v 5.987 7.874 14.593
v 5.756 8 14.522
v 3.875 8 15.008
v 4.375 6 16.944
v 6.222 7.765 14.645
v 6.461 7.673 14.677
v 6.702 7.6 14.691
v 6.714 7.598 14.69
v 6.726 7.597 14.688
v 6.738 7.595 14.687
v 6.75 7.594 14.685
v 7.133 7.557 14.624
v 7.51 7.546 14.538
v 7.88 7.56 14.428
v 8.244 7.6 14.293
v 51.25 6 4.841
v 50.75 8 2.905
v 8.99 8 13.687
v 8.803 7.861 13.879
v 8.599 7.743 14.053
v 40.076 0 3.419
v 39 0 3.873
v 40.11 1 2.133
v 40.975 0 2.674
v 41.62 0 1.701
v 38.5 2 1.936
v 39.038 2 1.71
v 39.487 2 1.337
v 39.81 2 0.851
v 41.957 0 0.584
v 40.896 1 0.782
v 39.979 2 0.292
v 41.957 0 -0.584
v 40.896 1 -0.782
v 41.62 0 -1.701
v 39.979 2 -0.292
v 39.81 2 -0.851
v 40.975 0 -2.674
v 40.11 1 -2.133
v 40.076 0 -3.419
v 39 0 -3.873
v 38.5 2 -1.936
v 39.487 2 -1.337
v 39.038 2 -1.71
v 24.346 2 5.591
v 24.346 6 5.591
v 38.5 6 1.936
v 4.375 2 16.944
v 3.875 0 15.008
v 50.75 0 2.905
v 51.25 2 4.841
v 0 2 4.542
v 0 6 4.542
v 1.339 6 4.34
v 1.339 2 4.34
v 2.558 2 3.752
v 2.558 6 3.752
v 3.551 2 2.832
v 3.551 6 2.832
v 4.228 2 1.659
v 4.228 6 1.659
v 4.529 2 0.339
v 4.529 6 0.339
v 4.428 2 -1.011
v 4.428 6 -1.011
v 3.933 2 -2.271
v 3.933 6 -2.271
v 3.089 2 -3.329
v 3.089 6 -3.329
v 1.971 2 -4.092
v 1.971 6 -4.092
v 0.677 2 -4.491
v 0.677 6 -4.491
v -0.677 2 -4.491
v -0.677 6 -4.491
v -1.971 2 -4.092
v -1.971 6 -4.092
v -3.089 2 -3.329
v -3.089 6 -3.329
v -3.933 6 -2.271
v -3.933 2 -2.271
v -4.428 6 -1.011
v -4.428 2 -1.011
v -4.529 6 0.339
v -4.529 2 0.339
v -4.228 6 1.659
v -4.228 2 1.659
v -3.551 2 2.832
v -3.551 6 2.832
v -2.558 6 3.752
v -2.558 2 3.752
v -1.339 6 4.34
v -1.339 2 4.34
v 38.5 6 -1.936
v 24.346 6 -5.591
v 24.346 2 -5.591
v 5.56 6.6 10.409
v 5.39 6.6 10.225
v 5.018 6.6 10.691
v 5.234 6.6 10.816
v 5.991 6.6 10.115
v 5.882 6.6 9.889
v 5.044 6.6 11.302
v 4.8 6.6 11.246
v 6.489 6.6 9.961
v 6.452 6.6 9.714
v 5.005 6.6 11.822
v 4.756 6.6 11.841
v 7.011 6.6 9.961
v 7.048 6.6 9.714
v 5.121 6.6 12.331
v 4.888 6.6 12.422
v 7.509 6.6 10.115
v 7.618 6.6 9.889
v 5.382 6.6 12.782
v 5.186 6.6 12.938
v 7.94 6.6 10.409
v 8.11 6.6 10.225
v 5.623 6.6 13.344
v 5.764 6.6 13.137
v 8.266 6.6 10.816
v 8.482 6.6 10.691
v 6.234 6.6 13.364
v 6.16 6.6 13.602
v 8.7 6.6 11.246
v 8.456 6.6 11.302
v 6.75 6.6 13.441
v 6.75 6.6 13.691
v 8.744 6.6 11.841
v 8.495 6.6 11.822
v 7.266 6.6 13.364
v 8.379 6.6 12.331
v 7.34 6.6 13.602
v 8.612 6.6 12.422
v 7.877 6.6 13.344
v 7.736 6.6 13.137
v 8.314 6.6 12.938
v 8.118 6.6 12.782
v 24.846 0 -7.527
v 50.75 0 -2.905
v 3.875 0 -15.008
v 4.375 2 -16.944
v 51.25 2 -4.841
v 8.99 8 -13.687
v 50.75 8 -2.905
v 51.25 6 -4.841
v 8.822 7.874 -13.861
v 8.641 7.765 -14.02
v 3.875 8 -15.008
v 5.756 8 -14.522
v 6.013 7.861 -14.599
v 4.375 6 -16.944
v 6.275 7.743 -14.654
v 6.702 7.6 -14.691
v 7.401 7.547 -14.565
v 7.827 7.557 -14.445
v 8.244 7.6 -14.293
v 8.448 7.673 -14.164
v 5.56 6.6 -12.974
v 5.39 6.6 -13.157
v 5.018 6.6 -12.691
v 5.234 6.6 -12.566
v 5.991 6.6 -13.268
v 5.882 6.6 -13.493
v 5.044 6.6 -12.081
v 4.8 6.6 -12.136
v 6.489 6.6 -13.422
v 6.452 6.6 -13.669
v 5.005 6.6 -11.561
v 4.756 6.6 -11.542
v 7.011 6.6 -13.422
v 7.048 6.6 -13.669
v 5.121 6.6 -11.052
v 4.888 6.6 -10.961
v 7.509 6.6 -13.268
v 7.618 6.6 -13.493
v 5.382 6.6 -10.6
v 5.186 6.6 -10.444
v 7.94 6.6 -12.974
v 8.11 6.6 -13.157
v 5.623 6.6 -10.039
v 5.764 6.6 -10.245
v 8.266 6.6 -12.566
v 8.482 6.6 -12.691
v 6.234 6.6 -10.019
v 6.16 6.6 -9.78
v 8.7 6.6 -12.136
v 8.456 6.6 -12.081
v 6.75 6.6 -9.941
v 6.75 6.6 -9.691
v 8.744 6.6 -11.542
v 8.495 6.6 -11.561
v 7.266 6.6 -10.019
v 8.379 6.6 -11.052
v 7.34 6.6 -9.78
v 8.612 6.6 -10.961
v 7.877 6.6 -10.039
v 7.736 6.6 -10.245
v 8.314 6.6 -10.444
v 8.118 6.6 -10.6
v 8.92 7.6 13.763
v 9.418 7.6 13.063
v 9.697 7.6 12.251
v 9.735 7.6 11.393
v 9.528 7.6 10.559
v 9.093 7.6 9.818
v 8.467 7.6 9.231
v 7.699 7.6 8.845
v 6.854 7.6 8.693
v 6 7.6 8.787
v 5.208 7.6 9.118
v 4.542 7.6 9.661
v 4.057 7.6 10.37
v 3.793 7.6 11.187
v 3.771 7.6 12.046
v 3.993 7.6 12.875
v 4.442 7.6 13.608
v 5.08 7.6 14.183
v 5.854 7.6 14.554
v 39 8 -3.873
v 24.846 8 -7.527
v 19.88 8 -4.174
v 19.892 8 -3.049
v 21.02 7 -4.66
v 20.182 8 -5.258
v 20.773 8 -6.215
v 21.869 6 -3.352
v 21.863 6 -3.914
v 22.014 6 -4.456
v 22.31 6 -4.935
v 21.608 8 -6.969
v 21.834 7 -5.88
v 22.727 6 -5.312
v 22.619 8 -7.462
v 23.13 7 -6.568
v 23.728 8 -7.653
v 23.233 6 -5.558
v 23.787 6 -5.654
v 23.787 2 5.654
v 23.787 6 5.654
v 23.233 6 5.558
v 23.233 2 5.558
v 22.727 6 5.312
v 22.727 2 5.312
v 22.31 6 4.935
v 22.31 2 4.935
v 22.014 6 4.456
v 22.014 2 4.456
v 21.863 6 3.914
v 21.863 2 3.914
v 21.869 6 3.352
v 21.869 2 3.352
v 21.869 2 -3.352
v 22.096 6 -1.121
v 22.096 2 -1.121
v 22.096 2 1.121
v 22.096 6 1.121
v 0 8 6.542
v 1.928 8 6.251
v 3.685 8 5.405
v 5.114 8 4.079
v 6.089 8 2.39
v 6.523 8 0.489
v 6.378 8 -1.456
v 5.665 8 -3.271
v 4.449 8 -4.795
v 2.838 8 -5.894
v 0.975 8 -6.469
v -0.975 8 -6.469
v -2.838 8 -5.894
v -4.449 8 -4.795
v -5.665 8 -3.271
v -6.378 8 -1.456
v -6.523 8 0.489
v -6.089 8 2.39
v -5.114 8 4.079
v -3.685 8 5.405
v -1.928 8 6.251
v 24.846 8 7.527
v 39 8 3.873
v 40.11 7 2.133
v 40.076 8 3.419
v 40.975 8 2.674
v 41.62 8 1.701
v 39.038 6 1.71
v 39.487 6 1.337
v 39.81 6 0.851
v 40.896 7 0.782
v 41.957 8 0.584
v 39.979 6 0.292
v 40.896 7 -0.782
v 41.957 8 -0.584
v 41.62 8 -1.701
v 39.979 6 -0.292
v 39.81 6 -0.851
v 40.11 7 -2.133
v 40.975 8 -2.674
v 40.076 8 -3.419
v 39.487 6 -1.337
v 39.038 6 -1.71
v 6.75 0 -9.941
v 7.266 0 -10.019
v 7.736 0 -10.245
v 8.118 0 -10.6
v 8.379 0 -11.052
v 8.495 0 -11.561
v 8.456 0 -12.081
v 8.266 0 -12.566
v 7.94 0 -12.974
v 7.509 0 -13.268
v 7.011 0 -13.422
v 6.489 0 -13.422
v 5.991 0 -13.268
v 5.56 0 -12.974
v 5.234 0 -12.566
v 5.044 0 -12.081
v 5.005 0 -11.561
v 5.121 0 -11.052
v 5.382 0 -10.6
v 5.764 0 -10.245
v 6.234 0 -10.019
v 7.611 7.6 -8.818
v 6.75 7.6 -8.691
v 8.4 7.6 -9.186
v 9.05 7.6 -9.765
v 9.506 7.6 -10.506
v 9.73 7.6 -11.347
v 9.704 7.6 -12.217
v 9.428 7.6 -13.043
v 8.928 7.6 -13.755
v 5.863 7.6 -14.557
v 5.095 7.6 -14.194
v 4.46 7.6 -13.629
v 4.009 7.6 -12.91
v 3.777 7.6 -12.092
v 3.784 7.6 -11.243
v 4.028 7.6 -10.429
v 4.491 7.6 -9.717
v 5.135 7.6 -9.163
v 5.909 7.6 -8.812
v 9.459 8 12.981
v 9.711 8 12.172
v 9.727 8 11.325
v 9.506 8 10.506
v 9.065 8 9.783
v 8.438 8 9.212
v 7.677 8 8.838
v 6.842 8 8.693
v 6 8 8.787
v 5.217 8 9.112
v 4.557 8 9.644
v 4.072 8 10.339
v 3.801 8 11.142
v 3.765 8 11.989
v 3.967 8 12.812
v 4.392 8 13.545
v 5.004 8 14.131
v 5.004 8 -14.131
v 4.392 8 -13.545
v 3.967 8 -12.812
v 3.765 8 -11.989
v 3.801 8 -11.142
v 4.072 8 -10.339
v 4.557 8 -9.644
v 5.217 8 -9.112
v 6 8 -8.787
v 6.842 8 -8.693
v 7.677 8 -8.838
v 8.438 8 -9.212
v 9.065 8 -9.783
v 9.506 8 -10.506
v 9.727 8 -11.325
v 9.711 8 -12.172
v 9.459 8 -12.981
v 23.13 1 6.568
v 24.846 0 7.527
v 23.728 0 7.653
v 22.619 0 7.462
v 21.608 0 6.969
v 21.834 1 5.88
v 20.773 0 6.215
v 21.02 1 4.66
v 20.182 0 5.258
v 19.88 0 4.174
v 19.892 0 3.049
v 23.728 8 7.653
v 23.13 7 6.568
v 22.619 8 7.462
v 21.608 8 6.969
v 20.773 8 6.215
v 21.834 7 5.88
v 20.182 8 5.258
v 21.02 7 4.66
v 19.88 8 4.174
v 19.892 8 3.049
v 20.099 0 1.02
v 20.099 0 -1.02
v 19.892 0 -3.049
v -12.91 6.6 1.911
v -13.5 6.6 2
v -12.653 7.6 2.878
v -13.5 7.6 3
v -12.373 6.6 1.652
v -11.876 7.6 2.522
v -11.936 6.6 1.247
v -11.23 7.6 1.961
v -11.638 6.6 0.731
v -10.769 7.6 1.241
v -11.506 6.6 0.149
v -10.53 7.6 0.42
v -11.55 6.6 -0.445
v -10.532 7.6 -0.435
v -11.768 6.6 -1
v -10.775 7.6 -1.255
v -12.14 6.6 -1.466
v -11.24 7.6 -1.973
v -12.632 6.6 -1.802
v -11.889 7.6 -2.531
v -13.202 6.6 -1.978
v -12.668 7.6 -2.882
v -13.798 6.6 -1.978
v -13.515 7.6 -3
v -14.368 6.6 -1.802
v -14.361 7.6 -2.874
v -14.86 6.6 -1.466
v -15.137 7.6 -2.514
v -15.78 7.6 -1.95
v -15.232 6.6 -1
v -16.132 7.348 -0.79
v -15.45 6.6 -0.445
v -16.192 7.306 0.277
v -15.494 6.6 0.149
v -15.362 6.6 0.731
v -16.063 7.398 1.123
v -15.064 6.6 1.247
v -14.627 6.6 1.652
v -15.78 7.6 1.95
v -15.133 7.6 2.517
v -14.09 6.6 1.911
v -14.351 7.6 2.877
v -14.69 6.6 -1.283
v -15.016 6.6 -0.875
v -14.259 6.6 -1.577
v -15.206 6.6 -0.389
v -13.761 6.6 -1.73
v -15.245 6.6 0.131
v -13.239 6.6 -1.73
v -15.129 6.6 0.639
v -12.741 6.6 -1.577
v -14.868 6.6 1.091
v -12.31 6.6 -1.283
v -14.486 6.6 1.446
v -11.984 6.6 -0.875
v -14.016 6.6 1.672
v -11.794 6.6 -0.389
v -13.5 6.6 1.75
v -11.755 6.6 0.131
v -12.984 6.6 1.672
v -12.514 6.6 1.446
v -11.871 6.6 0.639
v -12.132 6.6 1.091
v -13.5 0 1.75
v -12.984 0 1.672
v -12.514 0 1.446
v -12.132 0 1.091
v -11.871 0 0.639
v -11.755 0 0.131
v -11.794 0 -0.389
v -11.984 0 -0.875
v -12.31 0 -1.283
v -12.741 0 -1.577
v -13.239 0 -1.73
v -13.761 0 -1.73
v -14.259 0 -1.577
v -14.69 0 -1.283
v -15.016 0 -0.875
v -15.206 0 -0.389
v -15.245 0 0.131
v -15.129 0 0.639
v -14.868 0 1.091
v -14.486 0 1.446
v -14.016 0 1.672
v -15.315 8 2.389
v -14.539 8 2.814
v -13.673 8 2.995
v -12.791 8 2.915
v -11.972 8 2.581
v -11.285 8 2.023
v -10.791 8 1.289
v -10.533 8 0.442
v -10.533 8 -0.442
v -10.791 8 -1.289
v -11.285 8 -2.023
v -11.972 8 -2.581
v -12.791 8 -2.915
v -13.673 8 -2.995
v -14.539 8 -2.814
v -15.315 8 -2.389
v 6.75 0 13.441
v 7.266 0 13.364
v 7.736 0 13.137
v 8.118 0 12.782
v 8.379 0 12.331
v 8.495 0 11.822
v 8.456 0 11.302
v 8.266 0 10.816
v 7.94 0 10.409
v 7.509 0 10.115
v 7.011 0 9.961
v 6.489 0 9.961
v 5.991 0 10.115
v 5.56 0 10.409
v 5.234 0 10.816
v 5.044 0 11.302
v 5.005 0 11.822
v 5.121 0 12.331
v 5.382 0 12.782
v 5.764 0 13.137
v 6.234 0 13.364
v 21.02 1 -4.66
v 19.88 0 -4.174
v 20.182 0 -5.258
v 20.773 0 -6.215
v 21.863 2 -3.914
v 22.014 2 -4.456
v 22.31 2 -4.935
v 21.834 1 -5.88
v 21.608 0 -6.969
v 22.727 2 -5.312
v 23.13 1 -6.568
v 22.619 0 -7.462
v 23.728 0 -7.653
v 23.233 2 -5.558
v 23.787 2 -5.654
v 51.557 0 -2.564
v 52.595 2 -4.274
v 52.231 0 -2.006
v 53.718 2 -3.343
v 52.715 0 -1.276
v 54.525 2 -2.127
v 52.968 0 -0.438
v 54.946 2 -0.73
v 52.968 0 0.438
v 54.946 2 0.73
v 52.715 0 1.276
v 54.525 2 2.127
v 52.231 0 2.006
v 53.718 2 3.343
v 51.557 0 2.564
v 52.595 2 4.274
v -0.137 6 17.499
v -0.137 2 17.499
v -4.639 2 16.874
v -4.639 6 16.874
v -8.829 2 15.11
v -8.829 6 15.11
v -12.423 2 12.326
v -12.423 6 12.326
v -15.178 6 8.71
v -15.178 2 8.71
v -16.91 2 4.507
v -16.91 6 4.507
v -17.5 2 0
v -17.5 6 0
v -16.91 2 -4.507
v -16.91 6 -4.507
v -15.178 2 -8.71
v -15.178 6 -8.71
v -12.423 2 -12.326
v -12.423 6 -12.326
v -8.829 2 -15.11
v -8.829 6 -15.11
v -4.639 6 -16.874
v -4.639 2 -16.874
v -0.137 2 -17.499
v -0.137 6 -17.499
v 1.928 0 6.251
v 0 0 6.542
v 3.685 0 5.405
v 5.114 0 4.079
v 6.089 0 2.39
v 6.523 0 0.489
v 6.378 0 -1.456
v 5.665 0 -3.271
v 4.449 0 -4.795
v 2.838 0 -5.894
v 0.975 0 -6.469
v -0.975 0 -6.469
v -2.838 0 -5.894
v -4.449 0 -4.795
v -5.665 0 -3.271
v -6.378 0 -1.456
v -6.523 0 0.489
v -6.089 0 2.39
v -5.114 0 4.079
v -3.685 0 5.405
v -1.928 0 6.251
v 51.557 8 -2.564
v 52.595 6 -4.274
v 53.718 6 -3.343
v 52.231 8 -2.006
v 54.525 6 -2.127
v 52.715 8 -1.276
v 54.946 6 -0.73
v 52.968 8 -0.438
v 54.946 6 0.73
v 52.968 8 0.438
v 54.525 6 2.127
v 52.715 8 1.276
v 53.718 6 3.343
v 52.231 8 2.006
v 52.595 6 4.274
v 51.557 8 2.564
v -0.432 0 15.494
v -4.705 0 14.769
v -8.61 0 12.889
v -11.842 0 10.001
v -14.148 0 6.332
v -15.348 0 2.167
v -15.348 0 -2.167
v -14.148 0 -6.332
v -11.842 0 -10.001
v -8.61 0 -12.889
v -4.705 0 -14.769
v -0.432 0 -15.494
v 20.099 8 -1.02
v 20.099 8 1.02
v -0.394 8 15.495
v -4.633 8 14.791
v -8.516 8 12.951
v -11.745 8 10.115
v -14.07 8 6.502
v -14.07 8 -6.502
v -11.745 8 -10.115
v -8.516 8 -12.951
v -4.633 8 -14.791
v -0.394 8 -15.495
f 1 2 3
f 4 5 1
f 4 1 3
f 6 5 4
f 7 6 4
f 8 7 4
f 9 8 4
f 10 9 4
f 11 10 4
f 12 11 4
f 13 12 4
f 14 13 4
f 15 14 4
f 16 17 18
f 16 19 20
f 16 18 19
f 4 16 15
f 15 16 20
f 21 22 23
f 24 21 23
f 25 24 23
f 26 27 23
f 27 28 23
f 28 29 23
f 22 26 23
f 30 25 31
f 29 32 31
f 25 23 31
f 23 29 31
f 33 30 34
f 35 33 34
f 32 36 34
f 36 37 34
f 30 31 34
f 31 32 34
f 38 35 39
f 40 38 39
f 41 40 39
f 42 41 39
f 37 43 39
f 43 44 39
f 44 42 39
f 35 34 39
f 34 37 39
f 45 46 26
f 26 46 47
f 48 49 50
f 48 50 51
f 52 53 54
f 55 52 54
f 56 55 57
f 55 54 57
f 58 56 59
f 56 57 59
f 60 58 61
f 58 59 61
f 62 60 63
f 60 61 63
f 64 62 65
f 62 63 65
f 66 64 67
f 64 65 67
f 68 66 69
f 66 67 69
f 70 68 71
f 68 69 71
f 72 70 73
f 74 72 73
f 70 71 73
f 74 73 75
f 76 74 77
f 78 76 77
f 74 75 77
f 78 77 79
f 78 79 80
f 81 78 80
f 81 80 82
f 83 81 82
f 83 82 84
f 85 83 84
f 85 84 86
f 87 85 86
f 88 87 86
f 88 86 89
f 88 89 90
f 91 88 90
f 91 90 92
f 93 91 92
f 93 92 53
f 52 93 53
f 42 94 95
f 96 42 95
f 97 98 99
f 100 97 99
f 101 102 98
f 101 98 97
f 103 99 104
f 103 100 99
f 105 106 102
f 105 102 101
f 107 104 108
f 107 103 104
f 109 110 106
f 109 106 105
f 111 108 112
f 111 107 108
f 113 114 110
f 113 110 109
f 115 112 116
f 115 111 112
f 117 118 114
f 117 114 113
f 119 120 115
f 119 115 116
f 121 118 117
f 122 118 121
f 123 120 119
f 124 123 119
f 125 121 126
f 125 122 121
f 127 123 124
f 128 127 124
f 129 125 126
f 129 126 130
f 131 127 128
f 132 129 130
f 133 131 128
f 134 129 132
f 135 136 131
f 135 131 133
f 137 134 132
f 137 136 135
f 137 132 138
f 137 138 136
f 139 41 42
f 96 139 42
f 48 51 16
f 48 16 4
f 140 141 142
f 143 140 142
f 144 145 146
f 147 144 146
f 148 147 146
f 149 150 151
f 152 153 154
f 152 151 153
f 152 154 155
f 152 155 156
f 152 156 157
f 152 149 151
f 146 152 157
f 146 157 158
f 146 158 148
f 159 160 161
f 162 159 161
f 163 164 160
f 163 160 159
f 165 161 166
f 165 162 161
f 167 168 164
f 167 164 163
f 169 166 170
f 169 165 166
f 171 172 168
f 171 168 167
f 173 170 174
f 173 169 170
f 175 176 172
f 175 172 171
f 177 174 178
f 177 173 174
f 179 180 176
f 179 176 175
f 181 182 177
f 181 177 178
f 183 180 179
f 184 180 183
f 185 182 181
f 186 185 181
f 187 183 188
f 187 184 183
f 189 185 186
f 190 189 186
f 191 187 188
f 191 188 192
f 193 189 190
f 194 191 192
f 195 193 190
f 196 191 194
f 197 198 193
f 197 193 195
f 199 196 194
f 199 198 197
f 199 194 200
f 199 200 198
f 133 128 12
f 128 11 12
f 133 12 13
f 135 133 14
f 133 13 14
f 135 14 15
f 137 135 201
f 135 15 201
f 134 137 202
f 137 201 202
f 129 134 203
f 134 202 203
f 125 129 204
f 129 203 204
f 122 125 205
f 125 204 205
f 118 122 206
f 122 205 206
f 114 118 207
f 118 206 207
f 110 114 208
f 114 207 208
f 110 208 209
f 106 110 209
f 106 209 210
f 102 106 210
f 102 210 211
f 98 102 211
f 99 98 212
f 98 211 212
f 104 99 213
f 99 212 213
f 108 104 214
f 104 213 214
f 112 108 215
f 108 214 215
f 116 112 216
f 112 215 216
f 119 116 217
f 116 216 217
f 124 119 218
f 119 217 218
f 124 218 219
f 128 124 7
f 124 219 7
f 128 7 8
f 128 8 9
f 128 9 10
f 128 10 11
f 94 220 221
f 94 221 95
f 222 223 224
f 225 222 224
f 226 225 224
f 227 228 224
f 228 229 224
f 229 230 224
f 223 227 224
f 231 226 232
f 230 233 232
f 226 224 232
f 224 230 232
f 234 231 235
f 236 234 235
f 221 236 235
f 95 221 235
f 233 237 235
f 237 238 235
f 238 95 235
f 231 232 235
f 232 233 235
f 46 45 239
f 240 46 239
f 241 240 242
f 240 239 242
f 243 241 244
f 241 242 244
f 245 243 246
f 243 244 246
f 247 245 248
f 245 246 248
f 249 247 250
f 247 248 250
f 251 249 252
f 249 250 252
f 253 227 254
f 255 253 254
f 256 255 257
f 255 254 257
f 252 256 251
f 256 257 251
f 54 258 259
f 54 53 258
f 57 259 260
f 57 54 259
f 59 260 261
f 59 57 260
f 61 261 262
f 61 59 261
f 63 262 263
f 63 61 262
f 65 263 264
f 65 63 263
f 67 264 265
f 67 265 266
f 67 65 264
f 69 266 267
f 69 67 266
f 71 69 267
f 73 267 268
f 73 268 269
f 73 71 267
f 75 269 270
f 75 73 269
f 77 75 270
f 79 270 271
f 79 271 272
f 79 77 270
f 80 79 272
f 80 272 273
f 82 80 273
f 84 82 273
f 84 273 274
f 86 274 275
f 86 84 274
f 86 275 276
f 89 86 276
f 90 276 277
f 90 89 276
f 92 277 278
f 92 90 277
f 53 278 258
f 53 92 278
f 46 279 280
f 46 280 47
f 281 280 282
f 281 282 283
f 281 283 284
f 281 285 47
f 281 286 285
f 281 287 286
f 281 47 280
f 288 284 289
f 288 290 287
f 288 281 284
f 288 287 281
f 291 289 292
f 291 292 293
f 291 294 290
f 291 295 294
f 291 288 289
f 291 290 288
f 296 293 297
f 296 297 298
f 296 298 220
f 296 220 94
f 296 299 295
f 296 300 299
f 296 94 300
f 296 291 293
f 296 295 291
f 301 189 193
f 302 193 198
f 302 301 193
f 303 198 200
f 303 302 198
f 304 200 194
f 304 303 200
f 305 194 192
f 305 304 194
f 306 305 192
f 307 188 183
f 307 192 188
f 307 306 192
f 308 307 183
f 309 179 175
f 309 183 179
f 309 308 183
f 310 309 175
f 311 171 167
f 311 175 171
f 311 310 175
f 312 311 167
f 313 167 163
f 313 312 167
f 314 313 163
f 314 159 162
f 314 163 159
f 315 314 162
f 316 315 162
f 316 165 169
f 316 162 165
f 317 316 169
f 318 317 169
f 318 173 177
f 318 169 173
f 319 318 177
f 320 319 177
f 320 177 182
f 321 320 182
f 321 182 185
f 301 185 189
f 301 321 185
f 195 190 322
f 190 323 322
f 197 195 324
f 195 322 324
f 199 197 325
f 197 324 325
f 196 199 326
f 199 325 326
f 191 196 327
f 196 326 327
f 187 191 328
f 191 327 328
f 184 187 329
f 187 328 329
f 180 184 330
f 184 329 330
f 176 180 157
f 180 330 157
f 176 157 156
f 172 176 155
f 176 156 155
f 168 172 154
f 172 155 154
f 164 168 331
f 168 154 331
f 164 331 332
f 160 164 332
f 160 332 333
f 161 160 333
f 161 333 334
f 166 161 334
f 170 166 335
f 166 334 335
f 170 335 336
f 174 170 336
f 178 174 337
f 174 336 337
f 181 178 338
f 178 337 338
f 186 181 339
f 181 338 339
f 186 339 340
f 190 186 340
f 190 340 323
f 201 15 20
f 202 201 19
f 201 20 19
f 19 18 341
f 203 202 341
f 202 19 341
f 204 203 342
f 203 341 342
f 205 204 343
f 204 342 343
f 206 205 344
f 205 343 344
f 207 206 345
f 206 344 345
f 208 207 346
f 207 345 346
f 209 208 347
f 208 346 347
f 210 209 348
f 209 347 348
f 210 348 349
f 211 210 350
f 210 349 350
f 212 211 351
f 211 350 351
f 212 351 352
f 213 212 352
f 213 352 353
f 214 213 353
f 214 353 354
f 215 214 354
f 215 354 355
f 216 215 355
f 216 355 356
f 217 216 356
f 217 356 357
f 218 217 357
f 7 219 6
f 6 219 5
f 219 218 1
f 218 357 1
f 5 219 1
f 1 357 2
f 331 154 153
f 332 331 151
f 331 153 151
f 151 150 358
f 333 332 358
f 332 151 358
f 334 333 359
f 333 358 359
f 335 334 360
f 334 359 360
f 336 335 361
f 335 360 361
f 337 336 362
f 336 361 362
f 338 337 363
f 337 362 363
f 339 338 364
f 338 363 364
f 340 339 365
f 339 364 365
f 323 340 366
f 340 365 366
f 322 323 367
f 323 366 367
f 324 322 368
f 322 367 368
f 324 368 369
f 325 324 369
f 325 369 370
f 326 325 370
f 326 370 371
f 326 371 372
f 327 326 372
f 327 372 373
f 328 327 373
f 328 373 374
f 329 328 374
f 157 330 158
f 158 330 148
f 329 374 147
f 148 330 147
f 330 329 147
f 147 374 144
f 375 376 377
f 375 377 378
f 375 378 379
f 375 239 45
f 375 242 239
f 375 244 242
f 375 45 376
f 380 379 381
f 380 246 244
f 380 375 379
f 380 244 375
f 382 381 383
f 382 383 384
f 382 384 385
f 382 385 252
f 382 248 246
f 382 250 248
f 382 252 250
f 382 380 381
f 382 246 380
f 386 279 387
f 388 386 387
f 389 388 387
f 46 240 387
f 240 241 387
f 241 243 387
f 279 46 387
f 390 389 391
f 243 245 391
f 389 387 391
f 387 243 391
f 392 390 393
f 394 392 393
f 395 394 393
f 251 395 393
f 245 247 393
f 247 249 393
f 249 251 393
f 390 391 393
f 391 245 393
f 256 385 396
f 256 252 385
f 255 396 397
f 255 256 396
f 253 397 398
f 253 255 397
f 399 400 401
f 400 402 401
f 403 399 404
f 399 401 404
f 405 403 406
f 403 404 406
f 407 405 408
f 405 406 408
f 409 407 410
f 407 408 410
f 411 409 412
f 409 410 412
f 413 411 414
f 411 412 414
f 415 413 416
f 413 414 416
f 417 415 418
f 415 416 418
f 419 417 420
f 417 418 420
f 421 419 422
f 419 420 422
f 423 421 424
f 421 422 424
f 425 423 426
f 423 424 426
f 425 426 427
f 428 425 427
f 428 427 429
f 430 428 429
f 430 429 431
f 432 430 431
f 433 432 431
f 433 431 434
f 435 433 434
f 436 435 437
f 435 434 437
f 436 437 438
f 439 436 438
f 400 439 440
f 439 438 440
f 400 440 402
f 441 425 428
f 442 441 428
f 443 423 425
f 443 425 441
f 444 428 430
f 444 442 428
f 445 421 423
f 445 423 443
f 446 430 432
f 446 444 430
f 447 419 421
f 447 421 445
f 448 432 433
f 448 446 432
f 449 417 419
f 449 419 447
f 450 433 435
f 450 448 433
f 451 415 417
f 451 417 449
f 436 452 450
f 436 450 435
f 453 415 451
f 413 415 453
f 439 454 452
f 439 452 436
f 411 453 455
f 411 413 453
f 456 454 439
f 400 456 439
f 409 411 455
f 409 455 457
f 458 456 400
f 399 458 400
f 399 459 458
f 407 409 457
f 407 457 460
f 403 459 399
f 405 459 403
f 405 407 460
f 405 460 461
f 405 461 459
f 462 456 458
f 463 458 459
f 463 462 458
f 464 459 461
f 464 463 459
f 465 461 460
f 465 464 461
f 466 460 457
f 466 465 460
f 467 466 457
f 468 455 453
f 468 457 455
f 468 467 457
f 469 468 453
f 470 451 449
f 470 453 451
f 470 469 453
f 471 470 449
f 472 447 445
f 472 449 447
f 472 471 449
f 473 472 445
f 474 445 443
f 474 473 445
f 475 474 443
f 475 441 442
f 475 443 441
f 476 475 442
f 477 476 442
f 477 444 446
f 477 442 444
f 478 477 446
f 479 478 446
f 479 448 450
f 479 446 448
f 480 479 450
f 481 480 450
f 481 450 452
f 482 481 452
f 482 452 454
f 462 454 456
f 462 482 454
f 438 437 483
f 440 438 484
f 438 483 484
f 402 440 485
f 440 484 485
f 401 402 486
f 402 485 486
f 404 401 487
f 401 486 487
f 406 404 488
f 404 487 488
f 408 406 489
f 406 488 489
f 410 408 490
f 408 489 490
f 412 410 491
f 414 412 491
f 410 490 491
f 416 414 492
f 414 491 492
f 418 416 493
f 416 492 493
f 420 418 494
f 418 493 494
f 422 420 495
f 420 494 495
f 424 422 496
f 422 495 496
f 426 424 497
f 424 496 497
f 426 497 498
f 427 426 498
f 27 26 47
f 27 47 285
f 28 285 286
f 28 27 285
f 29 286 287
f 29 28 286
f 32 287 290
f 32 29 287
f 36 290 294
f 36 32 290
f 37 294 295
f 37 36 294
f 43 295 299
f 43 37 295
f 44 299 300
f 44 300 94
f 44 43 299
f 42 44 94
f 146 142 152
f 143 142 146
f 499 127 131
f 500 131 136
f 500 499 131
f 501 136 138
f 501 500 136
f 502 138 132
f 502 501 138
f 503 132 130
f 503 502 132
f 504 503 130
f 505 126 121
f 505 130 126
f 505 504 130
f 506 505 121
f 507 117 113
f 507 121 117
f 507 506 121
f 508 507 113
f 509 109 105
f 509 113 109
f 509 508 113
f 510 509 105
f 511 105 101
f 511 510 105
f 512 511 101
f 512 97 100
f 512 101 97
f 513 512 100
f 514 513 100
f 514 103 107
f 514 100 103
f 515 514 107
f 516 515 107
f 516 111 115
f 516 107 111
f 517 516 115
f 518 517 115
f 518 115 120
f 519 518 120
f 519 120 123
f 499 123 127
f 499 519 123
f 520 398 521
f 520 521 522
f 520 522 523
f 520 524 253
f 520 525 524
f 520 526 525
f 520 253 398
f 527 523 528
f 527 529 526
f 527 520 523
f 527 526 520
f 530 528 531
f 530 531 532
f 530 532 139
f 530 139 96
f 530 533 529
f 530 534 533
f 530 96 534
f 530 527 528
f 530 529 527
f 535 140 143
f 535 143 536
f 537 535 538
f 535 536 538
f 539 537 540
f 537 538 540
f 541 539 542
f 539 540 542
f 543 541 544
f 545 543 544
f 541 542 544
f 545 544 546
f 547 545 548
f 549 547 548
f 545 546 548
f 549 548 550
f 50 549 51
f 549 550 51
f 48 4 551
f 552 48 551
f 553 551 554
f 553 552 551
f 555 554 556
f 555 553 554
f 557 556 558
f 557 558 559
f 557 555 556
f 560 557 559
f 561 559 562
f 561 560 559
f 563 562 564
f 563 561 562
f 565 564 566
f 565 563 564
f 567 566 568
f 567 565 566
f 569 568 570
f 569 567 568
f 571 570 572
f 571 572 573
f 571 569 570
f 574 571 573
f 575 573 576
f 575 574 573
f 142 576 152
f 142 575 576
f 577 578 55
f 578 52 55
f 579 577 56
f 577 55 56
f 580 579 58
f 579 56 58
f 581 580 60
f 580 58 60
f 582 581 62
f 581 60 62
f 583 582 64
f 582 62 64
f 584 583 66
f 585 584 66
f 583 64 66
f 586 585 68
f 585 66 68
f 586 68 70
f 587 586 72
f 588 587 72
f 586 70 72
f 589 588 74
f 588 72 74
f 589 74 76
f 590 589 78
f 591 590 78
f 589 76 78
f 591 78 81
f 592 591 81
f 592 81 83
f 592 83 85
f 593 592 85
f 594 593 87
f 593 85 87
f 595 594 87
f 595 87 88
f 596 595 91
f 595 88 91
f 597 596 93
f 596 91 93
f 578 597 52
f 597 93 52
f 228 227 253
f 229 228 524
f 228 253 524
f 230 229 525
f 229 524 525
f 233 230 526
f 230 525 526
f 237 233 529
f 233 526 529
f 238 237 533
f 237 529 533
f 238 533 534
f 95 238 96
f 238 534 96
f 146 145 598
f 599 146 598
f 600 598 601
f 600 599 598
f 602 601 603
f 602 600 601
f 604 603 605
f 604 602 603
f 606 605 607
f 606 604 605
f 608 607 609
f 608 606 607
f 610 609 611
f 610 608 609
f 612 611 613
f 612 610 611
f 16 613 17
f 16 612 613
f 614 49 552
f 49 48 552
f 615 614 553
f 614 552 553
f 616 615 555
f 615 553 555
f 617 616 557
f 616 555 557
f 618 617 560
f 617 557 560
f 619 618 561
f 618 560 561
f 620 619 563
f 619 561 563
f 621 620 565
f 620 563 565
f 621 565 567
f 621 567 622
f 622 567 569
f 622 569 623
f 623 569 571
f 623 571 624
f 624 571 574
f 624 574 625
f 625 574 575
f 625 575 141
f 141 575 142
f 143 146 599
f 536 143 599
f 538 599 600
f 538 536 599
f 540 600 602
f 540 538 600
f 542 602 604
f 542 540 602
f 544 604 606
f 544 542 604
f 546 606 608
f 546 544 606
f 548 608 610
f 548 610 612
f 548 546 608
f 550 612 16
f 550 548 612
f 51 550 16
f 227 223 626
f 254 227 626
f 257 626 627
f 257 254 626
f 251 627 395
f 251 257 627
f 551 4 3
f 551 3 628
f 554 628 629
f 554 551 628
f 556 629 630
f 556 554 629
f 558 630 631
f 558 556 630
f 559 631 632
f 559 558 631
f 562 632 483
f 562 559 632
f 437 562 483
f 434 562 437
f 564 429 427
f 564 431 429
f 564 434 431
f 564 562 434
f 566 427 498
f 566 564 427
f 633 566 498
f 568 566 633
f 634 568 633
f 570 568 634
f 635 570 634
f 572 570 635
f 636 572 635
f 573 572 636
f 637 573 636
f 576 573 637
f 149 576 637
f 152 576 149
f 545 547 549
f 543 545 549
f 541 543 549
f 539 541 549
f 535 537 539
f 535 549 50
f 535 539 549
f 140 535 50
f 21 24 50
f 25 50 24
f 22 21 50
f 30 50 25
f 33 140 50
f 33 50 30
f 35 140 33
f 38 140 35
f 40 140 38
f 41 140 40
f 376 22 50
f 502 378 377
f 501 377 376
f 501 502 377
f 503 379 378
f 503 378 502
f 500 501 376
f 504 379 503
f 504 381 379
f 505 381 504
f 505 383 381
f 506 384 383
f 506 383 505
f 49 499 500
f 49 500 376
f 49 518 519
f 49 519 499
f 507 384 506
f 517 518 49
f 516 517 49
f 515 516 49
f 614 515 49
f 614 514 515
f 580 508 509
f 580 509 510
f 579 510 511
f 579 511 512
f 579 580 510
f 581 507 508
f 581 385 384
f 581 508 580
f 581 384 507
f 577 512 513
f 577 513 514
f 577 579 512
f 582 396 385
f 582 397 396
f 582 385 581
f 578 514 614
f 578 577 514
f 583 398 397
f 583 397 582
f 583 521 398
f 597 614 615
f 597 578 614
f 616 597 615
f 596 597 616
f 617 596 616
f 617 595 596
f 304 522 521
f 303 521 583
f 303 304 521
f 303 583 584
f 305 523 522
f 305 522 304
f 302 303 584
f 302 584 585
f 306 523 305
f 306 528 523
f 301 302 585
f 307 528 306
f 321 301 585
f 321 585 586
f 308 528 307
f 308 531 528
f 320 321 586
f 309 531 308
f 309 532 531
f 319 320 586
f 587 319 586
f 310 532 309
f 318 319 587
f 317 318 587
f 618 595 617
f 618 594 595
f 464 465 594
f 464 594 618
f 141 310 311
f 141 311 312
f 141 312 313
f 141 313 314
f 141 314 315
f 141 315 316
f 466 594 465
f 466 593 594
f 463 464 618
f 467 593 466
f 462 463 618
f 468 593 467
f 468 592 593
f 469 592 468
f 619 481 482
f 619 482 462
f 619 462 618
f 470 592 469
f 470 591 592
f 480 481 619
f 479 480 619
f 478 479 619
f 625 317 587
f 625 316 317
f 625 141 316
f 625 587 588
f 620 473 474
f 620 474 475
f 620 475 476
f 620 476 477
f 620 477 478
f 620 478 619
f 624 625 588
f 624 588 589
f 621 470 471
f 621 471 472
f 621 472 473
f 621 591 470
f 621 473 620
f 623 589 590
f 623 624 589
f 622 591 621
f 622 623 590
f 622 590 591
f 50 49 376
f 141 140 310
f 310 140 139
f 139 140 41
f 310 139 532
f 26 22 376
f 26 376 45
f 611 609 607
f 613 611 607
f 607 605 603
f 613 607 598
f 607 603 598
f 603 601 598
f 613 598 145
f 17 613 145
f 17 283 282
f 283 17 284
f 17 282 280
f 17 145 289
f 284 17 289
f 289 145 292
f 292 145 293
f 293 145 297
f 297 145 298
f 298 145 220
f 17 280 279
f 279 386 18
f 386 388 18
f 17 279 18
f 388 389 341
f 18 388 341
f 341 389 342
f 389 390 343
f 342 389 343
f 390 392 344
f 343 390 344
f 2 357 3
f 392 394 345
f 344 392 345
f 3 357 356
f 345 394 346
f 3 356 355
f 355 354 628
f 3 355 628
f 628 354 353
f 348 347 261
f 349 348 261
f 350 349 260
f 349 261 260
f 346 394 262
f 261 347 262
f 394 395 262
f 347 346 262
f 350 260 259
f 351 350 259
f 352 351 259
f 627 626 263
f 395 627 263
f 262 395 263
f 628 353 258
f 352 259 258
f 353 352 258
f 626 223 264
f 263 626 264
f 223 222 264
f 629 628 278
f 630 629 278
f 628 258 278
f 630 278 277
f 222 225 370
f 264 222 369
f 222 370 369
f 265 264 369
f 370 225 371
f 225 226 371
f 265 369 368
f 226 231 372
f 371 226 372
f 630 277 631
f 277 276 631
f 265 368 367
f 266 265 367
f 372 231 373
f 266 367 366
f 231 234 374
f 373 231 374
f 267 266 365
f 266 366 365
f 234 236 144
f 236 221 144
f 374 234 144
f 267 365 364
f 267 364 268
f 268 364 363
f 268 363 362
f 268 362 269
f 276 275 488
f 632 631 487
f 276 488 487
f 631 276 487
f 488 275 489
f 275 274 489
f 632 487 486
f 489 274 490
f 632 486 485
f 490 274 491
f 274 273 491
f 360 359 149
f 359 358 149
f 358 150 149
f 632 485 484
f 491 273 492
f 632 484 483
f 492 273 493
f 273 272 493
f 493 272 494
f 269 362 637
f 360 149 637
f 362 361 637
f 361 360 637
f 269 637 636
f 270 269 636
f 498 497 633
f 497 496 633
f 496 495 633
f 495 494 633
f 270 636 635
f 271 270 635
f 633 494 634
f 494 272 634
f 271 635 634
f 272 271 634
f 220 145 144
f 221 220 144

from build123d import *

# Parameters (mm, degrees)
SKETCH1_R           = 1.75
BOSS_EXTRUDE1_DEPTH = 8
SKETCH2_R           = 3
CUT_EXTRUDE1_DEPTH  = 1.4
CUT_EXTRUDE2_DEPTH  = 59.268773799
FILLET1_R           = 2
CHAMFER1_SIZE       = 1
SKETCH4_R           = 4.541609358
CUT_EXTRUDE3_DEPTH  = 59.268773799
CHAMFER2_SIZE       = 2


with BuildPart() as part:
    # Sketch1 → Boss-Extrude1 (new body)
    with BuildSketch(Plane(origin=(0, 0, 0), x_dir=(1, 0, 0), z_dir=(0, 1, 0))):
        with BuildLine():
            Line((4.375, 16.94430214), (51.25, 4.841229183))
            ThreePointArc((51.25, 4.841229183), (55, 0), (51.25, -4.841229183))
            Line((51.25, -4.841229183), (4.375, -16.94430214))
            ThreePointArc((4.375, -16.94430214), (-17.5, 0), (4.375, 16.94430214))
        make_face()
        with Locations(Location((6.75, 11.691342951, 0), (0, 0, 270))):
            Circle(SKETCH1_R, mode=Mode.SUBTRACT)
        with Locations(Location((-13.5, 0, 0), (0, 0, 270))):
            Circle(SKETCH1_R, mode=Mode.SUBTRACT)
        with Locations(Location((6.75, -11.691342951, 0), (0, 0, 270))):
            Circle(SKETCH1_R, mode=Mode.SUBTRACT)
    extrude(amount=BOSS_EXTRUDE1_DEPTH)

    # Sketch2 → Cut-Extrude1 (cut)
    with BuildSketch(Plane(origin=(0, 8, 0), x_dir=(1, 0, 0), z_dir=(0, 1, 0))):
        with Locations(Location((6.75, -11.691342951, 0), (0, 0, 270))):
            Circle(SKETCH2_R)
        with Locations(Location((6.75, 11.691342951, 0), (0, 0, 270))):
            Circle(SKETCH2_R)
        with Locations(Location((-13.5, 0, 0), (0, 0, 270))):
            Circle(SKETCH2_R)
    extrude(amount=-CUT_EXTRUDE1_DEPTH, mode=Mode.SUBTRACT)

    # Sketch3 → Cut-Extrude2 (cut, through all)
    with BuildSketch(Plane(origin=(0, 8, 0), x_dir=(1, 0, 0), z_dir=(0, 1, 0))):
        with BuildLine():
            Line((21.175820833, -6.4095755), (46, 0))
            Line((46, 0), (21.175820833, 6.4095755))
            ThreePointArc((21.175820833, 6.4095755), (22.124602732, 0), (21.175820833, -6.4095755))
        make_face()
    extrude(amount=-CUT_EXTRUDE2_DEPTH, mode=Mode.SUBTRACT)

    # Fillet1
    fillet1_edges = [part.edges().sort_by_distance(p)[0] for p in [
        (21.175820833, 4, 6.4095755),
        (21.175820833, 4, -6.4095755),
        (46, 4, 0),
    ]]
    fillet(fillet1_edges, radius=FILLET1_R)

    # Chamfer1
    chamfer1_edges = [part.edges().sort_by_distance(p)[0] for p in [
        (6.75, 6.6, 8.691342951),
        (6.75, 6.6, -14.691342951),
        (-13.5, 6.6, -3),
    ]]
    chamfer(chamfer1_edges, length=CHAMFER1_SIZE)

    # Sketch4 → Cut-Extrude3 (cut, through all)
    with BuildSketch(Plane(origin=(0, 8, 0), x_dir=(1, 0, 0), z_dir=(0, 1, 0))):
        with Locations(Location((0, 0, 0), (0, 0, 270))):
            Circle(SKETCH4_R)
    extrude(amount=-CUT_EXTRUDE3_DEPTH, mode=Mode.SUBTRACT)

    # Chamfer2
    # the kernel refuses this chamfer: 2 mm, written as the material it takes off along each edge
    with BuildSketch(Plane(origin=(38, 0, 0), x_dir=(0.25, 0, 0.9682458365518543), z_dir=(-0.9682458365518543, 0, 0.25))) as chamfer2_piece_1:
        Polygon((2 + CHAMFER2_SIZE, 0), (2, CHAMFER2_SIZE), (2, 0), align=None)
    revolve(axis=Axis((38, 0, 0), (0, 1, 0)), revolution_arc=151.044975628, mode=Mode.SUBTRACT)
    with BuildSketch(Plane(origin=(24.346197065, 0, -5.590987877), x_dir=(0.24990547922782413, -0.027495876610586372, -0.9678797591753465), z_dir=(0.9682458365518543, 0, 0.24999999999999997)), Plane(origin=(38.5, 0, 1.936491673), x_dir=(0.2499054792278243, -0.027495876610585942, 0.9678797591753466), z_dir=(-0.9682458365518543, 0, 0.2500000000000001)), Plane(origin=(38.5, 8, -1.936491673), x_dir=(0.24990547922782413, 0.027495876610586497, -0.9678797591753466), z_dir=(-0.9682458365518543, 0, -0.24999999999999997)), Plane(origin=(24.346197065, 8, 5.590987877), x_dir=(0.2499054792278243, 0.02749587661058648, 0.9678797591753466), z_dir=(0.9682458365518543, 0, -0.2500000000000001))) as chamfer2_piece_2:
        Polygon((CHAMFER2_SIZE * 0.999621916911, CHAMFER2_SIZE * 0.0274958766106), (-CHAMFER2_SIZE * 0.0274958766106, CHAMFER2_SIZE * 0.999621916911), (0, 0), align=None)
    extrude(amount=14.617984814, mode=Mode.SUBTRACT)
    with BuildSketch(Plane(origin=(23.846197065, 0, -3.654496203), x_dir=(-0.9884596787014585, 0, 0.15148420241533292), z_dir=(0.15148420241533292, 0, 0.9884596787014585))) as chamfer2_piece_3:
        Polygon((2 + CHAMFER2_SIZE, 0), (2, -CHAMFER2_SIZE), (2, 0), align=None)
    revolve(axis=Axis((23.846197065, 0, -3.654496203), (0, -1, 0)), revolution_arc=113.190460245, mode=Mode.SUBTRACT)
    with BuildSketch(Plane(origin=(23.846197065, 0, 3.654496203), x_dir=(0.25000000000000006, 0, 0.9682458365518543), z_dir=(0.9682458365518543, 0, -0.25000000000000006))) as chamfer2_piece_4:
        Polygon((2 + CHAMFER2_SIZE, 0), (2, -CHAMFER2_SIZE), (2, 0), align=None)
    revolve(axis=Axis((23.846197065, 0, 3.654496203), (0, -1, 0)), revolution_arc=113.190460245, mode=Mode.SUBTRACT)
    with BuildSketch(Plane(origin=(0, 0, 0), x_dir=(0.988459678701458, 0, 0.151484202415335), z_dir=(-0.151484202415335, 0, 0.988459678701458))) as chamfer2_piece_5:
        Polygon((22.124602732 - CHAMFER2_SIZE, 0), (22.124602732, CHAMFER2_SIZE), (22.124602732, 0), align=None)
    revolve(axis=Axis((0, 0, 0), (0, 1, 0)), revolution_arc=17.425896117, mode=Mode.SUBTRACT)
    with BuildSketch(Plane(origin=(23.846197065, 8, -3.654496203), x_dir=(-0.9884596787014583, 0, 0.15148420241533467), z_dir=(0.15148420241533467, 0, 0.9884596787014583))) as chamfer2_piece_6:
        Polygon((2 + CHAMFER2_SIZE, 0), (2, CHAMFER2_SIZE), (2, 0), align=None)
    revolve(axis=Axis((23.846197065, 8, -3.654496203), (0, -1, 0)), revolution_arc=113.190460245, mode=Mode.SUBTRACT)
    with BuildSketch(Plane(origin=(0, 8, 0), x_dir=(0.9884596787014582, 0, -0.1514842024153346), z_dir=(-0.1514842024153346, 0, -0.9884596787014582))) as chamfer2_piece_7:
        Polygon((22.124602732 - CHAMFER2_SIZE, 0), (22.124602732, CHAMFER2_SIZE), (22.124602732, 0), align=None)
    revolve(axis=Axis((0, 8, 0), (0, -1, 0)), revolution_arc=17.425896117, mode=Mode.SUBTRACT)
    with BuildSketch(Plane(origin=(23.846197065, 8, 3.654496203), x_dir=(0.25000000000000006, 0, 0.9682458365518543), z_dir=(0.9682458365518543, 0, -0.25000000000000006))) as chamfer2_piece_8:
        Polygon((2 + CHAMFER2_SIZE, 0), (2, CHAMFER2_SIZE), (2, 0), align=None)
    revolve(axis=Axis((23.846197065, 8, 3.654496203), (0, -1, 0)), revolution_arc=113.190460245, mode=Mode.SUBTRACT)
    with BuildSketch(Plane(origin=(38, 8, 0), x_dir=(0.25, 0, 0.9682458365518543), z_dir=(-0.9682458365518543, 0, 0.25))) as chamfer2_piece_9:
        Polygon((2 + CHAMFER2_SIZE, 0), (2, -CHAMFER2_SIZE), (2, 0), align=None)
    revolve(axis=Axis((38, 8, 0), (0, 1, 0)), revolution_arc=151.044975628, mode=Mode.SUBTRACT)
    with BuildSketch(Plane(origin=(4.375, 0, -16.94430214), x_dir=(-0.24990547922782413, -0.027495876610586365, 0.9678797591753465), z_dir=(0.9682458365518543, 0, 0.24999999999999997)), Plane(origin=(51.25, 0, 4.841229183), x_dir=(-0.2499054792278242, -0.027495876610586348, -0.9678797591753466), z_dir=(-0.9682458365518543, 0, 0.24999999999999997))) as chamfer2_piece_10:
        Polygon((CHAMFER2_SIZE * 0.999621916911, -CHAMFER2_SIZE * 0.0274958766106), (-CHAMFER2_SIZE * 0.0274958766106, -CHAMFER2_SIZE * 0.999621916911), (0, 0), align=None)
    extrude(amount=48.412291828, mode=Mode.SUBTRACT)
    with BuildSketch(Plane(origin=(0, 0, 0), x_dir=(0.24999999999999994, 0, 0.9682458365518543), z_dir=(0.9682458365518543, 0, -0.24999999999999994))) as chamfer2_piece_11:
        Polygon((17.5 - CHAMFER2_SIZE, 0), (17.5, -CHAMFER2_SIZE), (17.5, 0), align=None)
    revolve(axis=Axis((0, 0, 0), (0, -1, 0)), revolution_arc=208.955024372, mode=Mode.SUBTRACT)
    with BuildSketch(Plane(origin=(50, 0, 0), x_dir=(0.25000000000000105, 0, -0.9682458365518539), z_dir=(-0.9682458365518539, 0, -0.25000000000000105))) as chamfer2_piece_12:
        Polygon((5 - CHAMFER2_SIZE, 0), (5, -CHAMFER2_SIZE), (5, 0), align=None)
    revolve(axis=Axis((50, 0, 0), (0, -1, 0)), revolution_arc=151.044975628, mode=Mode.SUBTRACT)
    with BuildSketch(Plane(origin=(50, 8, 0), x_dir=(0.25000000000000105, 0, -0.9682458365518539), z_dir=(-0.9682458365518539, 0, -0.25000000000000105))) as chamfer2_piece_13:
        Polygon((5 - CHAMFER2_SIZE, 0), (5, CHAMFER2_SIZE), (5, 0), align=None)
    revolve(axis=Axis((50, 8, 0), (0, -1, 0)), revolution_arc=151.044975628, mode=Mode.SUBTRACT)
    with BuildSketch(Plane(origin=(0, 0, 0), x_dir=(0, 0, 1), z_dir=(-1, 0, 0))) as chamfer2_piece_14:
        Polygon((4.541609358 + CHAMFER2_SIZE, 0), (4.541609358, CHAMFER2_SIZE), (4.541609358, 0), align=None)
    revolve(axis=Axis((0, 0, 0), (0, 1, 0)), mode=Mode.SUBTRACT)
    with BuildSketch(Plane(origin=(0, 8, 0), x_dir=(0, 0, 1), z_dir=(-1, 0, 0))) as chamfer2_piece_15:
        Polygon((4.541609358 + CHAMFER2_SIZE, 0), (4.541609358, -CHAMFER2_SIZE), (4.541609358, 0), align=None)
    revolve(axis=Axis((0, 8, 0), (0, 1, 0)), mode=Mode.SUBTRACT)
    with BuildSketch(Plane(origin=(4.375, 8, -16.94430214), x_dir=(-0.24990547922782413, 0.02749587661058648, 0.9678797591753465), z_dir=(0.9682458365518543, 0, 0.24999999999999997)), Plane(origin=(51.25, 8, 4.841229183), x_dir=(-0.2499054792278242, 0.027495876610586473, -0.9678797591753466), z_dir=(-0.9682458365518543, 0, 0.24999999999999997))) as chamfer2_piece_16:
        Polygon((CHAMFER2_SIZE * 0.999621916911, CHAMFER2_SIZE * 0.0274958766106), (-CHAMFER2_SIZE * 0.0274958766106, CHAMFER2_SIZE * 0.999621916911), (0, 0), align=None)
    extrude(amount=48.412291828, mode=Mode.SUBTRACT)
    with BuildSketch(Plane(origin=(0, 8, 0), x_dir=(0.24999999999999994, 0, 0.9682458365518543), z_dir=(0.9682458365518543, 0, -0.24999999999999994))) as chamfer2_piece_17:
        Polygon((17.5 - CHAMFER2_SIZE, 0), (17.5, CHAMFER2_SIZE), (17.5, 0), align=None)
    revolve(axis=Axis((0, 8, 0), (0, -1, 0)), revolution_arc=208.955024372, mode=Mode.SUBTRACT)


solid = part.part
